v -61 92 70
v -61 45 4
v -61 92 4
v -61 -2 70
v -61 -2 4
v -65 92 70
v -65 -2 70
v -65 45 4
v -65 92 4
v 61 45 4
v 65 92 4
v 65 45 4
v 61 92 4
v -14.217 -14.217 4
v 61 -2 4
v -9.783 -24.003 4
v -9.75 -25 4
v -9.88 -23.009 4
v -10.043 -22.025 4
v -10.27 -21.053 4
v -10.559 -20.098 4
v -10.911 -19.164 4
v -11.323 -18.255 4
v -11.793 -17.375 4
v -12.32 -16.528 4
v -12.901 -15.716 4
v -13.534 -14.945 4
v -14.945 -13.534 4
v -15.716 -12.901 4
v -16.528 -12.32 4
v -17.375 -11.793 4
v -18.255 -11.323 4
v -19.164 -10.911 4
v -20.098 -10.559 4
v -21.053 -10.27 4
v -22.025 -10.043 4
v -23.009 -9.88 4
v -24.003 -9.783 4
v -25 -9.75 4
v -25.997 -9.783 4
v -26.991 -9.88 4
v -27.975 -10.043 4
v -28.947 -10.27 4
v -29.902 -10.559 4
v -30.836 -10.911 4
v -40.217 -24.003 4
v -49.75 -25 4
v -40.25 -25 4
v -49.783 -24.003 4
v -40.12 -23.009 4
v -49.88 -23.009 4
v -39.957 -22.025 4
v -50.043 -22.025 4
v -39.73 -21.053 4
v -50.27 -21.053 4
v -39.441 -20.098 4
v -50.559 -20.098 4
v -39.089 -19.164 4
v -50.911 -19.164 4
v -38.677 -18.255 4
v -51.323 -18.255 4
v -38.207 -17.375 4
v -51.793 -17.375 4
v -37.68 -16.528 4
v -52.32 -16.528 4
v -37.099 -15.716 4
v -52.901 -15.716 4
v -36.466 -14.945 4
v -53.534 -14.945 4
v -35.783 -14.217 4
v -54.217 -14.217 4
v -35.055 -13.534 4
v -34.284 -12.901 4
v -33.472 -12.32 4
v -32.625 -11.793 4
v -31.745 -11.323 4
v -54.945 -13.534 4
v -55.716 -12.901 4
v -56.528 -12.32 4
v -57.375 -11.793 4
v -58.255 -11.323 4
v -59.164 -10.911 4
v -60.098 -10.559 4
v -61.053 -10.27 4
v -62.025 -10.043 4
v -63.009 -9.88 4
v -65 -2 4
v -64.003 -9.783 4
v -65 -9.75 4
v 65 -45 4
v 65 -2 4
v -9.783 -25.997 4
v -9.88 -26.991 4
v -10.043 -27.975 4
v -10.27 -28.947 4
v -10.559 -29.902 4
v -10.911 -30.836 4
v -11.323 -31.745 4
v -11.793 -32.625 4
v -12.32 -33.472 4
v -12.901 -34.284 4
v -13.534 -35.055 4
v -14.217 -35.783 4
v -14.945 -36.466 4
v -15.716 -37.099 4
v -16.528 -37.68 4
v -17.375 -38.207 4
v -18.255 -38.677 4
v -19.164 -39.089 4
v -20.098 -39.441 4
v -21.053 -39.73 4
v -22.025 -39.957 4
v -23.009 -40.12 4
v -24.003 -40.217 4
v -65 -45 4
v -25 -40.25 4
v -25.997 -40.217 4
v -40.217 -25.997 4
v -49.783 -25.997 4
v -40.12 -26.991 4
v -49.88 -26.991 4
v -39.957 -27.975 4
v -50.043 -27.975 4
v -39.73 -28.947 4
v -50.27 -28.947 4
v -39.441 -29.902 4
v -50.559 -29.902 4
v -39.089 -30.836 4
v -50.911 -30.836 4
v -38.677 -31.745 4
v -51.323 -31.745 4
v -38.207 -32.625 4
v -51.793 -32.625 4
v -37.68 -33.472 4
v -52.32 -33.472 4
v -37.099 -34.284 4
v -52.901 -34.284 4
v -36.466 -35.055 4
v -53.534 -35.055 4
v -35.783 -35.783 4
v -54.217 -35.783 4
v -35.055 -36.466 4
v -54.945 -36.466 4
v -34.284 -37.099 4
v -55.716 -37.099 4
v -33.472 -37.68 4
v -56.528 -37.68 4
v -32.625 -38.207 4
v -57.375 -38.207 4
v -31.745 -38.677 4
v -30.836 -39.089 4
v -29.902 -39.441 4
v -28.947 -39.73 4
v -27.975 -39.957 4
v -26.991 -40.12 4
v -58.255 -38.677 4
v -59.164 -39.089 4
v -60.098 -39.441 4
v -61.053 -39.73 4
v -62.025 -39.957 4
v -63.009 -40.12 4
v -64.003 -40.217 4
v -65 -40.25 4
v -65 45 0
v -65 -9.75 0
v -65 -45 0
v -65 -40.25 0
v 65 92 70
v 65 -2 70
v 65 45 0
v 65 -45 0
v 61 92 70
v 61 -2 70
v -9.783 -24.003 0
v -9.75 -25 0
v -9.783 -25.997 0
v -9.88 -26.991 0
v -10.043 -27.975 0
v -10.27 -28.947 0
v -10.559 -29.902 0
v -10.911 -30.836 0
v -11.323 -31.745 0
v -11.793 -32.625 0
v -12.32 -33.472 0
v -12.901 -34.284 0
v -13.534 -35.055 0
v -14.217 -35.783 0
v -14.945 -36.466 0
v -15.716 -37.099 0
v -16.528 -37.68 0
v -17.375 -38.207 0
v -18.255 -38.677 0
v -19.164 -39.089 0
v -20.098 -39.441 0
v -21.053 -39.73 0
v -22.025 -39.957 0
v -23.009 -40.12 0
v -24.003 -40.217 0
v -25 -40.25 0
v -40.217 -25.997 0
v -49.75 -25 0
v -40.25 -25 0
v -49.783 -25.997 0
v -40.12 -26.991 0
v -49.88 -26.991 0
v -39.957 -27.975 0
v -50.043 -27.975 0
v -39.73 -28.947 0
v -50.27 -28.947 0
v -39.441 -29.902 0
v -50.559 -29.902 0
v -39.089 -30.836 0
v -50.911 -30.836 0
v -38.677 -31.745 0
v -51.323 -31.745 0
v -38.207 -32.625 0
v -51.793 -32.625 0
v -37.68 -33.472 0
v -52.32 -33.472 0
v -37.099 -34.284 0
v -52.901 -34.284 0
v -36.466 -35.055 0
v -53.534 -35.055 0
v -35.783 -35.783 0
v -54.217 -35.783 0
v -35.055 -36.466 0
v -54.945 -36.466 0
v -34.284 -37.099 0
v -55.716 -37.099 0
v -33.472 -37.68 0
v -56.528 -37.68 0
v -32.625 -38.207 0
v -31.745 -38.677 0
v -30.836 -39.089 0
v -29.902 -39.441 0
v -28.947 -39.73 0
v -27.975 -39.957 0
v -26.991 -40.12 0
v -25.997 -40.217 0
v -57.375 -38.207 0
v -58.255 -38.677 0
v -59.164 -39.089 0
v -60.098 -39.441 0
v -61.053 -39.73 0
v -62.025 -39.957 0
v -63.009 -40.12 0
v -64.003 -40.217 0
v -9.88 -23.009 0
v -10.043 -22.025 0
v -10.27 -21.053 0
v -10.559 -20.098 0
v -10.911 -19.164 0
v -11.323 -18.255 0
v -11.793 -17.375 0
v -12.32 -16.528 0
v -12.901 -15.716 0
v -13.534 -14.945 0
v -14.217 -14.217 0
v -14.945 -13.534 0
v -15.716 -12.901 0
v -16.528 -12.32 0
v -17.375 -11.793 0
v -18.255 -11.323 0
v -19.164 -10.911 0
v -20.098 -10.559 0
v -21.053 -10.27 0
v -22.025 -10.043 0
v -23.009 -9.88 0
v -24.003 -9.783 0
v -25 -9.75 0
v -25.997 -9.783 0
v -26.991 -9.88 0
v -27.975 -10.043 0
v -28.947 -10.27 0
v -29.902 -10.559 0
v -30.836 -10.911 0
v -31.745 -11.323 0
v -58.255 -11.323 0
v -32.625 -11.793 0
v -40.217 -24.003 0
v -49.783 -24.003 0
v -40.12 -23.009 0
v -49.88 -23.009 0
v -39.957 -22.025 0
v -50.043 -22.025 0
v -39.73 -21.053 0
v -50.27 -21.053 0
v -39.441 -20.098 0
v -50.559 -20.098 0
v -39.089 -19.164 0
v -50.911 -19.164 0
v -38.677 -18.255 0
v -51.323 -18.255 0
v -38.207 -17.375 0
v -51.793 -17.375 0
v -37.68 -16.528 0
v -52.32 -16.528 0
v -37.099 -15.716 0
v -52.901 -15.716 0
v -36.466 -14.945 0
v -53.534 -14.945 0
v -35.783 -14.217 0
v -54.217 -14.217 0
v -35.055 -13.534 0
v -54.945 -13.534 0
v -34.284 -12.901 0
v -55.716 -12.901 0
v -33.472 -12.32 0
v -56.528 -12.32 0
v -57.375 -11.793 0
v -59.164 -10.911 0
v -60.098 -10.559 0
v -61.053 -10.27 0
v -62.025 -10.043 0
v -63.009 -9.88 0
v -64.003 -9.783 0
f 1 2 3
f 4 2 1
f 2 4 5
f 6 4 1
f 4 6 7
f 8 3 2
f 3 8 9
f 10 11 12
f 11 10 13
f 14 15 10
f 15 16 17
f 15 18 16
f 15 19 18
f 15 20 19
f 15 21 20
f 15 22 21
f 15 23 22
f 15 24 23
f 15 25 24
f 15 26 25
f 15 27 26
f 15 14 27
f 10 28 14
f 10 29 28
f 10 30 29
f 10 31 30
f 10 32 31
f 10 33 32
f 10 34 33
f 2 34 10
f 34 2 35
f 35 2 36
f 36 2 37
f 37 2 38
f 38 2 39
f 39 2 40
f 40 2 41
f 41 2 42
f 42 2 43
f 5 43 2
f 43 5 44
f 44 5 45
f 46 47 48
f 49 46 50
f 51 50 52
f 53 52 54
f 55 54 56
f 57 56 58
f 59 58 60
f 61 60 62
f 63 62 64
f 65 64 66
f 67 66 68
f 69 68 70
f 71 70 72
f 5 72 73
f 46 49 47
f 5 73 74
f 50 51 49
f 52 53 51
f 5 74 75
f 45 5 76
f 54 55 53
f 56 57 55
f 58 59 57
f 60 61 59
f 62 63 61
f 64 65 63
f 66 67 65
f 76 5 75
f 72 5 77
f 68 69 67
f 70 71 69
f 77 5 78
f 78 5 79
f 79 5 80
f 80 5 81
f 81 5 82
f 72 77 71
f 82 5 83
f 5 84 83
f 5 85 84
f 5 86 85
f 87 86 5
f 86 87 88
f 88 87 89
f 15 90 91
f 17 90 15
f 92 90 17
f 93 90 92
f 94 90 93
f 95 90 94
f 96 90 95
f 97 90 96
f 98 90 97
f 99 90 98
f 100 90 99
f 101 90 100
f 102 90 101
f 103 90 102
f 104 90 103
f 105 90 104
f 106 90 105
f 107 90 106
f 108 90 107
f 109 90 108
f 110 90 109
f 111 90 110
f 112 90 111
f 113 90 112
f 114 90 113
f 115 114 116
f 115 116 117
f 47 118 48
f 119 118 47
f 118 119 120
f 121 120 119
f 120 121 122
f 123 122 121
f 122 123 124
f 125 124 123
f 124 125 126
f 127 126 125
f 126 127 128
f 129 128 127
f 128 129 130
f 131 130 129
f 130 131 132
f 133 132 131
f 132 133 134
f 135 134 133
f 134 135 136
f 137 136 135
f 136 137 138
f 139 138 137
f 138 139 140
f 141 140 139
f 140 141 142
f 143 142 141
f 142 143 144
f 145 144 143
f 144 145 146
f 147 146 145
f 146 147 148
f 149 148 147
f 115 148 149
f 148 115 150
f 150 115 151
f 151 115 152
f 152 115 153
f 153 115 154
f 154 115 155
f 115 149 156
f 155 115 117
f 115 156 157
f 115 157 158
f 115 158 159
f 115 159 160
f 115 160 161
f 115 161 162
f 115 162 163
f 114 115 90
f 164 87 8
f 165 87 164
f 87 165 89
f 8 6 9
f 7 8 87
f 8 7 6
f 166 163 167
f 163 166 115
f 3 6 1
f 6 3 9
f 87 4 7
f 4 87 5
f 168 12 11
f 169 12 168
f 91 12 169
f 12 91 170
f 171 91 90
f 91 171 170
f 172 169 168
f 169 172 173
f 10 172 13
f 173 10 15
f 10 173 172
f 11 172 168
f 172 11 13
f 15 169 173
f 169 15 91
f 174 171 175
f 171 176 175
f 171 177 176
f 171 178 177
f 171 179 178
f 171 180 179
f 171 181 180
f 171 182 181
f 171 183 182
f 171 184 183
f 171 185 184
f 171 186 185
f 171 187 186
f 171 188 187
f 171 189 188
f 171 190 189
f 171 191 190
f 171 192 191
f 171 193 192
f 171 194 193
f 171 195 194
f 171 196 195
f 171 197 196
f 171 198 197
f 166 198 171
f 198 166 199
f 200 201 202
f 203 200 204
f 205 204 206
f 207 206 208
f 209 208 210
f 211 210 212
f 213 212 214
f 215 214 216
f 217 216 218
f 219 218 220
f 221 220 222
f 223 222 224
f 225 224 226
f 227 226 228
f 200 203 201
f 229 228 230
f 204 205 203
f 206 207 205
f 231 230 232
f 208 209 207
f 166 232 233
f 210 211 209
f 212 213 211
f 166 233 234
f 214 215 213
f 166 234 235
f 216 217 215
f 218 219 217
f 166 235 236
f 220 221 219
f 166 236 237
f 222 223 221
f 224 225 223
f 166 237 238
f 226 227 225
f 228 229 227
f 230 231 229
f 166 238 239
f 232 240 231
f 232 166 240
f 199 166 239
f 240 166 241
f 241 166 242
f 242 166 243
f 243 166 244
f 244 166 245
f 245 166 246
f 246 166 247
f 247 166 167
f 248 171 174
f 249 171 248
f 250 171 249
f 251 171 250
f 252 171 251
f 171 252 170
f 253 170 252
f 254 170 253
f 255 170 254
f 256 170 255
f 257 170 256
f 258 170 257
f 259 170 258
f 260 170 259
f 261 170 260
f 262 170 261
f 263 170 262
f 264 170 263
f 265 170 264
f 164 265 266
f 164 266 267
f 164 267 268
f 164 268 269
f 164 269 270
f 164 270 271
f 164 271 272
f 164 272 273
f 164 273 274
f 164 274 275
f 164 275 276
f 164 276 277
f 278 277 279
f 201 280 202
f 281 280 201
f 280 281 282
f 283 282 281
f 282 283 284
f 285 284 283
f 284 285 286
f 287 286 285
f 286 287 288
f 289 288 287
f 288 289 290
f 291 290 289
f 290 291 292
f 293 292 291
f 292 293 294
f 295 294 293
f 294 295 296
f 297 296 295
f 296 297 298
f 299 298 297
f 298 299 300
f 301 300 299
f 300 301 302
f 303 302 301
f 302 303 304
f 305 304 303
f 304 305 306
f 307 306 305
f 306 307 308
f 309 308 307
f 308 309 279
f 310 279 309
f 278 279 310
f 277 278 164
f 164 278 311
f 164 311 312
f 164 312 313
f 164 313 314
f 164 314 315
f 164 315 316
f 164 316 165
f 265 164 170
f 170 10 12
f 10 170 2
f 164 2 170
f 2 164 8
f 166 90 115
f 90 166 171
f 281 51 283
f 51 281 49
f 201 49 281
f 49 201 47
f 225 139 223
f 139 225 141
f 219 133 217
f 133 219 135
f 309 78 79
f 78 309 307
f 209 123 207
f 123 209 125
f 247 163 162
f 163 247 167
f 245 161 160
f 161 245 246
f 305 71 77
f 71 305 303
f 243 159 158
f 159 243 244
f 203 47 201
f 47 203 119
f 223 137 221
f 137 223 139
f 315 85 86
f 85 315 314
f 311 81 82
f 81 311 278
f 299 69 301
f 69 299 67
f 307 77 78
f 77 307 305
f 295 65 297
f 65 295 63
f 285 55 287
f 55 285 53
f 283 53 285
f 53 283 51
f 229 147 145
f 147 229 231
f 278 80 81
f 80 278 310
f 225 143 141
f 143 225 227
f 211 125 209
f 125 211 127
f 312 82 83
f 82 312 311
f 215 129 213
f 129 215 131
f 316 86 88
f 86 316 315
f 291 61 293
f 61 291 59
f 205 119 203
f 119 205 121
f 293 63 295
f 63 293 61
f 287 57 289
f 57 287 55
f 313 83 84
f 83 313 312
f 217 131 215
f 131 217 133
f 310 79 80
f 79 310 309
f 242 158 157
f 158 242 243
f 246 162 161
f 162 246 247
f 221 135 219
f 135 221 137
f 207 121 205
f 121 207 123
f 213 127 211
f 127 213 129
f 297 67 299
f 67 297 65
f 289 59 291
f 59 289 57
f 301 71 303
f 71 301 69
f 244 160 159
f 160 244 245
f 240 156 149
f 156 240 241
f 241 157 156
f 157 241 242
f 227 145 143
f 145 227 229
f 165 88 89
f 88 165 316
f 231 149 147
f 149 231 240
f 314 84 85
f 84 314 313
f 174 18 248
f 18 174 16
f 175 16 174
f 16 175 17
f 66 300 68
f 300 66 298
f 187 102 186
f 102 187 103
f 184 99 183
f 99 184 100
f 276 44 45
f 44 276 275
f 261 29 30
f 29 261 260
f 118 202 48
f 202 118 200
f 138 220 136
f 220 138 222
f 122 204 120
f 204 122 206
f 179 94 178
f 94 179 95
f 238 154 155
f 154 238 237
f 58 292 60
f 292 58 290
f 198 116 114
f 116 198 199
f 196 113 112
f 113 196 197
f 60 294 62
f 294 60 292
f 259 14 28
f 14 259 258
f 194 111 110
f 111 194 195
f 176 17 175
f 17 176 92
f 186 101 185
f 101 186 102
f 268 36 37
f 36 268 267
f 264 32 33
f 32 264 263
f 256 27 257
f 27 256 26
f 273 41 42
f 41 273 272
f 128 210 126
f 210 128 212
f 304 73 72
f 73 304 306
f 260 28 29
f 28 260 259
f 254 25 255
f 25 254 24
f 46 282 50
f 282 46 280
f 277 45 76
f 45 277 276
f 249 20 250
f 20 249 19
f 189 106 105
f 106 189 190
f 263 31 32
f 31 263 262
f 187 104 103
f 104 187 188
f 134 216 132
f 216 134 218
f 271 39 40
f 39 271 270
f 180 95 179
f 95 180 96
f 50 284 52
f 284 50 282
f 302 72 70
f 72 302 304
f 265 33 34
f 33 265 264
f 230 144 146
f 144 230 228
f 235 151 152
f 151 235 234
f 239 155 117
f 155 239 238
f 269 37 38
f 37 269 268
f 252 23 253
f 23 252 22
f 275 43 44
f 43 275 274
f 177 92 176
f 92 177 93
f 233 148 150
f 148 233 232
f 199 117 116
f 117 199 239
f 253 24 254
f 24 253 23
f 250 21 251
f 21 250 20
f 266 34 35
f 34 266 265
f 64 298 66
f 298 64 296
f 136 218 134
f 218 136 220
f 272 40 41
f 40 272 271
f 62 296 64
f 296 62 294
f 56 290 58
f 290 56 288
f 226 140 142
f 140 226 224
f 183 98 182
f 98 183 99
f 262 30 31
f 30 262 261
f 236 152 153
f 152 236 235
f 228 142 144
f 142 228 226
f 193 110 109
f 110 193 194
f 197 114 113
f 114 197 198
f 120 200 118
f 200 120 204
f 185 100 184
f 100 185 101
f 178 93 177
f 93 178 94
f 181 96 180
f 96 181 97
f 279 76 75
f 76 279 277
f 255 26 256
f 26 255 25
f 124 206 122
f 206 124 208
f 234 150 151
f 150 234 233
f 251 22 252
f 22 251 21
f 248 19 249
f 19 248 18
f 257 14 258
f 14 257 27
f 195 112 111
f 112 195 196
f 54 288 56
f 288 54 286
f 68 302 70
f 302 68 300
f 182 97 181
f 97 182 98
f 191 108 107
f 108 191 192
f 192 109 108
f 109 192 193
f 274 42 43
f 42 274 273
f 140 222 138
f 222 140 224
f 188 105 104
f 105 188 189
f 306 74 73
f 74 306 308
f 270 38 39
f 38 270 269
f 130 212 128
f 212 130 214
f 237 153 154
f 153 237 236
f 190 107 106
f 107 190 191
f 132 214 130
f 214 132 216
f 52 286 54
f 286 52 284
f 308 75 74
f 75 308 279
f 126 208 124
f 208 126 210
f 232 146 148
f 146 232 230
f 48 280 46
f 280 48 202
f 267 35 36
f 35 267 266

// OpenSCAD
// Rack for six 50 mL conical (Falcon-type) tubes
// Print orientation: flat plate on bed, walls rising to z = 70
// After printing, flip over so the rack stands on the walls

// ---------- Parameters ----------
plate_x      = 130;   // plate length along X (mm)
plate_y      = 90;    // plate width along Y (mm)
plate_t      = 4;     // plate thickness (mm), z = 0 to 4

hole_d       = 30.5;  // through-hole diameter (mm)
hole_nx      = 3;     // holes along X (2 rows)
hole_ny      = 2;     // holes along Y (3 columns)
hole_pitch   = 40;    // centre-to-centre spacing, both directions (mm)

wall_h       = 66;    // wall height from plate top (mm), z = 4 to 70
wall_t       = 4;     // wall thickness along Y (mm)

eps          = 0.5;   // cutter overshoot past faces (mm)
$fn          = 96;    // circle resolution

// ---------- Derived ----------
wall_top_z = plate_t + wall_h;   // top of walls (z = 70)

// ---------- Model ----------
difference() {
    union() {
        // Flat plate
        translate([-plate_x/2, -plate_y/2, 0])
            cube([plate_x, plate_y, plate_t]);

        // Two solid walls along the long edges
        for (sx = [-1, 1])
            translate([sx > 0 ? plate_x/2 - wall_t : -plate_x/2,
                       -wall_t/2, plate_t])
                cube([wall_t, plate_y + wall_t, wall_h]);
    }

    // Through-holes, centred on the plate
    for (i = [0 : hole_nx - 1])
        for (j = [0 : hole_ny - 1])
            translate([(i - (hole_nx - 1)/2) * hole_pitch - plate_x/2,
                       (j - (hole_ny - 1)/2) * hole_pitch - plate_y/2,
                       -eps])
                cylinder(d = hole_d, h = plate_t + 2*eps);
}
